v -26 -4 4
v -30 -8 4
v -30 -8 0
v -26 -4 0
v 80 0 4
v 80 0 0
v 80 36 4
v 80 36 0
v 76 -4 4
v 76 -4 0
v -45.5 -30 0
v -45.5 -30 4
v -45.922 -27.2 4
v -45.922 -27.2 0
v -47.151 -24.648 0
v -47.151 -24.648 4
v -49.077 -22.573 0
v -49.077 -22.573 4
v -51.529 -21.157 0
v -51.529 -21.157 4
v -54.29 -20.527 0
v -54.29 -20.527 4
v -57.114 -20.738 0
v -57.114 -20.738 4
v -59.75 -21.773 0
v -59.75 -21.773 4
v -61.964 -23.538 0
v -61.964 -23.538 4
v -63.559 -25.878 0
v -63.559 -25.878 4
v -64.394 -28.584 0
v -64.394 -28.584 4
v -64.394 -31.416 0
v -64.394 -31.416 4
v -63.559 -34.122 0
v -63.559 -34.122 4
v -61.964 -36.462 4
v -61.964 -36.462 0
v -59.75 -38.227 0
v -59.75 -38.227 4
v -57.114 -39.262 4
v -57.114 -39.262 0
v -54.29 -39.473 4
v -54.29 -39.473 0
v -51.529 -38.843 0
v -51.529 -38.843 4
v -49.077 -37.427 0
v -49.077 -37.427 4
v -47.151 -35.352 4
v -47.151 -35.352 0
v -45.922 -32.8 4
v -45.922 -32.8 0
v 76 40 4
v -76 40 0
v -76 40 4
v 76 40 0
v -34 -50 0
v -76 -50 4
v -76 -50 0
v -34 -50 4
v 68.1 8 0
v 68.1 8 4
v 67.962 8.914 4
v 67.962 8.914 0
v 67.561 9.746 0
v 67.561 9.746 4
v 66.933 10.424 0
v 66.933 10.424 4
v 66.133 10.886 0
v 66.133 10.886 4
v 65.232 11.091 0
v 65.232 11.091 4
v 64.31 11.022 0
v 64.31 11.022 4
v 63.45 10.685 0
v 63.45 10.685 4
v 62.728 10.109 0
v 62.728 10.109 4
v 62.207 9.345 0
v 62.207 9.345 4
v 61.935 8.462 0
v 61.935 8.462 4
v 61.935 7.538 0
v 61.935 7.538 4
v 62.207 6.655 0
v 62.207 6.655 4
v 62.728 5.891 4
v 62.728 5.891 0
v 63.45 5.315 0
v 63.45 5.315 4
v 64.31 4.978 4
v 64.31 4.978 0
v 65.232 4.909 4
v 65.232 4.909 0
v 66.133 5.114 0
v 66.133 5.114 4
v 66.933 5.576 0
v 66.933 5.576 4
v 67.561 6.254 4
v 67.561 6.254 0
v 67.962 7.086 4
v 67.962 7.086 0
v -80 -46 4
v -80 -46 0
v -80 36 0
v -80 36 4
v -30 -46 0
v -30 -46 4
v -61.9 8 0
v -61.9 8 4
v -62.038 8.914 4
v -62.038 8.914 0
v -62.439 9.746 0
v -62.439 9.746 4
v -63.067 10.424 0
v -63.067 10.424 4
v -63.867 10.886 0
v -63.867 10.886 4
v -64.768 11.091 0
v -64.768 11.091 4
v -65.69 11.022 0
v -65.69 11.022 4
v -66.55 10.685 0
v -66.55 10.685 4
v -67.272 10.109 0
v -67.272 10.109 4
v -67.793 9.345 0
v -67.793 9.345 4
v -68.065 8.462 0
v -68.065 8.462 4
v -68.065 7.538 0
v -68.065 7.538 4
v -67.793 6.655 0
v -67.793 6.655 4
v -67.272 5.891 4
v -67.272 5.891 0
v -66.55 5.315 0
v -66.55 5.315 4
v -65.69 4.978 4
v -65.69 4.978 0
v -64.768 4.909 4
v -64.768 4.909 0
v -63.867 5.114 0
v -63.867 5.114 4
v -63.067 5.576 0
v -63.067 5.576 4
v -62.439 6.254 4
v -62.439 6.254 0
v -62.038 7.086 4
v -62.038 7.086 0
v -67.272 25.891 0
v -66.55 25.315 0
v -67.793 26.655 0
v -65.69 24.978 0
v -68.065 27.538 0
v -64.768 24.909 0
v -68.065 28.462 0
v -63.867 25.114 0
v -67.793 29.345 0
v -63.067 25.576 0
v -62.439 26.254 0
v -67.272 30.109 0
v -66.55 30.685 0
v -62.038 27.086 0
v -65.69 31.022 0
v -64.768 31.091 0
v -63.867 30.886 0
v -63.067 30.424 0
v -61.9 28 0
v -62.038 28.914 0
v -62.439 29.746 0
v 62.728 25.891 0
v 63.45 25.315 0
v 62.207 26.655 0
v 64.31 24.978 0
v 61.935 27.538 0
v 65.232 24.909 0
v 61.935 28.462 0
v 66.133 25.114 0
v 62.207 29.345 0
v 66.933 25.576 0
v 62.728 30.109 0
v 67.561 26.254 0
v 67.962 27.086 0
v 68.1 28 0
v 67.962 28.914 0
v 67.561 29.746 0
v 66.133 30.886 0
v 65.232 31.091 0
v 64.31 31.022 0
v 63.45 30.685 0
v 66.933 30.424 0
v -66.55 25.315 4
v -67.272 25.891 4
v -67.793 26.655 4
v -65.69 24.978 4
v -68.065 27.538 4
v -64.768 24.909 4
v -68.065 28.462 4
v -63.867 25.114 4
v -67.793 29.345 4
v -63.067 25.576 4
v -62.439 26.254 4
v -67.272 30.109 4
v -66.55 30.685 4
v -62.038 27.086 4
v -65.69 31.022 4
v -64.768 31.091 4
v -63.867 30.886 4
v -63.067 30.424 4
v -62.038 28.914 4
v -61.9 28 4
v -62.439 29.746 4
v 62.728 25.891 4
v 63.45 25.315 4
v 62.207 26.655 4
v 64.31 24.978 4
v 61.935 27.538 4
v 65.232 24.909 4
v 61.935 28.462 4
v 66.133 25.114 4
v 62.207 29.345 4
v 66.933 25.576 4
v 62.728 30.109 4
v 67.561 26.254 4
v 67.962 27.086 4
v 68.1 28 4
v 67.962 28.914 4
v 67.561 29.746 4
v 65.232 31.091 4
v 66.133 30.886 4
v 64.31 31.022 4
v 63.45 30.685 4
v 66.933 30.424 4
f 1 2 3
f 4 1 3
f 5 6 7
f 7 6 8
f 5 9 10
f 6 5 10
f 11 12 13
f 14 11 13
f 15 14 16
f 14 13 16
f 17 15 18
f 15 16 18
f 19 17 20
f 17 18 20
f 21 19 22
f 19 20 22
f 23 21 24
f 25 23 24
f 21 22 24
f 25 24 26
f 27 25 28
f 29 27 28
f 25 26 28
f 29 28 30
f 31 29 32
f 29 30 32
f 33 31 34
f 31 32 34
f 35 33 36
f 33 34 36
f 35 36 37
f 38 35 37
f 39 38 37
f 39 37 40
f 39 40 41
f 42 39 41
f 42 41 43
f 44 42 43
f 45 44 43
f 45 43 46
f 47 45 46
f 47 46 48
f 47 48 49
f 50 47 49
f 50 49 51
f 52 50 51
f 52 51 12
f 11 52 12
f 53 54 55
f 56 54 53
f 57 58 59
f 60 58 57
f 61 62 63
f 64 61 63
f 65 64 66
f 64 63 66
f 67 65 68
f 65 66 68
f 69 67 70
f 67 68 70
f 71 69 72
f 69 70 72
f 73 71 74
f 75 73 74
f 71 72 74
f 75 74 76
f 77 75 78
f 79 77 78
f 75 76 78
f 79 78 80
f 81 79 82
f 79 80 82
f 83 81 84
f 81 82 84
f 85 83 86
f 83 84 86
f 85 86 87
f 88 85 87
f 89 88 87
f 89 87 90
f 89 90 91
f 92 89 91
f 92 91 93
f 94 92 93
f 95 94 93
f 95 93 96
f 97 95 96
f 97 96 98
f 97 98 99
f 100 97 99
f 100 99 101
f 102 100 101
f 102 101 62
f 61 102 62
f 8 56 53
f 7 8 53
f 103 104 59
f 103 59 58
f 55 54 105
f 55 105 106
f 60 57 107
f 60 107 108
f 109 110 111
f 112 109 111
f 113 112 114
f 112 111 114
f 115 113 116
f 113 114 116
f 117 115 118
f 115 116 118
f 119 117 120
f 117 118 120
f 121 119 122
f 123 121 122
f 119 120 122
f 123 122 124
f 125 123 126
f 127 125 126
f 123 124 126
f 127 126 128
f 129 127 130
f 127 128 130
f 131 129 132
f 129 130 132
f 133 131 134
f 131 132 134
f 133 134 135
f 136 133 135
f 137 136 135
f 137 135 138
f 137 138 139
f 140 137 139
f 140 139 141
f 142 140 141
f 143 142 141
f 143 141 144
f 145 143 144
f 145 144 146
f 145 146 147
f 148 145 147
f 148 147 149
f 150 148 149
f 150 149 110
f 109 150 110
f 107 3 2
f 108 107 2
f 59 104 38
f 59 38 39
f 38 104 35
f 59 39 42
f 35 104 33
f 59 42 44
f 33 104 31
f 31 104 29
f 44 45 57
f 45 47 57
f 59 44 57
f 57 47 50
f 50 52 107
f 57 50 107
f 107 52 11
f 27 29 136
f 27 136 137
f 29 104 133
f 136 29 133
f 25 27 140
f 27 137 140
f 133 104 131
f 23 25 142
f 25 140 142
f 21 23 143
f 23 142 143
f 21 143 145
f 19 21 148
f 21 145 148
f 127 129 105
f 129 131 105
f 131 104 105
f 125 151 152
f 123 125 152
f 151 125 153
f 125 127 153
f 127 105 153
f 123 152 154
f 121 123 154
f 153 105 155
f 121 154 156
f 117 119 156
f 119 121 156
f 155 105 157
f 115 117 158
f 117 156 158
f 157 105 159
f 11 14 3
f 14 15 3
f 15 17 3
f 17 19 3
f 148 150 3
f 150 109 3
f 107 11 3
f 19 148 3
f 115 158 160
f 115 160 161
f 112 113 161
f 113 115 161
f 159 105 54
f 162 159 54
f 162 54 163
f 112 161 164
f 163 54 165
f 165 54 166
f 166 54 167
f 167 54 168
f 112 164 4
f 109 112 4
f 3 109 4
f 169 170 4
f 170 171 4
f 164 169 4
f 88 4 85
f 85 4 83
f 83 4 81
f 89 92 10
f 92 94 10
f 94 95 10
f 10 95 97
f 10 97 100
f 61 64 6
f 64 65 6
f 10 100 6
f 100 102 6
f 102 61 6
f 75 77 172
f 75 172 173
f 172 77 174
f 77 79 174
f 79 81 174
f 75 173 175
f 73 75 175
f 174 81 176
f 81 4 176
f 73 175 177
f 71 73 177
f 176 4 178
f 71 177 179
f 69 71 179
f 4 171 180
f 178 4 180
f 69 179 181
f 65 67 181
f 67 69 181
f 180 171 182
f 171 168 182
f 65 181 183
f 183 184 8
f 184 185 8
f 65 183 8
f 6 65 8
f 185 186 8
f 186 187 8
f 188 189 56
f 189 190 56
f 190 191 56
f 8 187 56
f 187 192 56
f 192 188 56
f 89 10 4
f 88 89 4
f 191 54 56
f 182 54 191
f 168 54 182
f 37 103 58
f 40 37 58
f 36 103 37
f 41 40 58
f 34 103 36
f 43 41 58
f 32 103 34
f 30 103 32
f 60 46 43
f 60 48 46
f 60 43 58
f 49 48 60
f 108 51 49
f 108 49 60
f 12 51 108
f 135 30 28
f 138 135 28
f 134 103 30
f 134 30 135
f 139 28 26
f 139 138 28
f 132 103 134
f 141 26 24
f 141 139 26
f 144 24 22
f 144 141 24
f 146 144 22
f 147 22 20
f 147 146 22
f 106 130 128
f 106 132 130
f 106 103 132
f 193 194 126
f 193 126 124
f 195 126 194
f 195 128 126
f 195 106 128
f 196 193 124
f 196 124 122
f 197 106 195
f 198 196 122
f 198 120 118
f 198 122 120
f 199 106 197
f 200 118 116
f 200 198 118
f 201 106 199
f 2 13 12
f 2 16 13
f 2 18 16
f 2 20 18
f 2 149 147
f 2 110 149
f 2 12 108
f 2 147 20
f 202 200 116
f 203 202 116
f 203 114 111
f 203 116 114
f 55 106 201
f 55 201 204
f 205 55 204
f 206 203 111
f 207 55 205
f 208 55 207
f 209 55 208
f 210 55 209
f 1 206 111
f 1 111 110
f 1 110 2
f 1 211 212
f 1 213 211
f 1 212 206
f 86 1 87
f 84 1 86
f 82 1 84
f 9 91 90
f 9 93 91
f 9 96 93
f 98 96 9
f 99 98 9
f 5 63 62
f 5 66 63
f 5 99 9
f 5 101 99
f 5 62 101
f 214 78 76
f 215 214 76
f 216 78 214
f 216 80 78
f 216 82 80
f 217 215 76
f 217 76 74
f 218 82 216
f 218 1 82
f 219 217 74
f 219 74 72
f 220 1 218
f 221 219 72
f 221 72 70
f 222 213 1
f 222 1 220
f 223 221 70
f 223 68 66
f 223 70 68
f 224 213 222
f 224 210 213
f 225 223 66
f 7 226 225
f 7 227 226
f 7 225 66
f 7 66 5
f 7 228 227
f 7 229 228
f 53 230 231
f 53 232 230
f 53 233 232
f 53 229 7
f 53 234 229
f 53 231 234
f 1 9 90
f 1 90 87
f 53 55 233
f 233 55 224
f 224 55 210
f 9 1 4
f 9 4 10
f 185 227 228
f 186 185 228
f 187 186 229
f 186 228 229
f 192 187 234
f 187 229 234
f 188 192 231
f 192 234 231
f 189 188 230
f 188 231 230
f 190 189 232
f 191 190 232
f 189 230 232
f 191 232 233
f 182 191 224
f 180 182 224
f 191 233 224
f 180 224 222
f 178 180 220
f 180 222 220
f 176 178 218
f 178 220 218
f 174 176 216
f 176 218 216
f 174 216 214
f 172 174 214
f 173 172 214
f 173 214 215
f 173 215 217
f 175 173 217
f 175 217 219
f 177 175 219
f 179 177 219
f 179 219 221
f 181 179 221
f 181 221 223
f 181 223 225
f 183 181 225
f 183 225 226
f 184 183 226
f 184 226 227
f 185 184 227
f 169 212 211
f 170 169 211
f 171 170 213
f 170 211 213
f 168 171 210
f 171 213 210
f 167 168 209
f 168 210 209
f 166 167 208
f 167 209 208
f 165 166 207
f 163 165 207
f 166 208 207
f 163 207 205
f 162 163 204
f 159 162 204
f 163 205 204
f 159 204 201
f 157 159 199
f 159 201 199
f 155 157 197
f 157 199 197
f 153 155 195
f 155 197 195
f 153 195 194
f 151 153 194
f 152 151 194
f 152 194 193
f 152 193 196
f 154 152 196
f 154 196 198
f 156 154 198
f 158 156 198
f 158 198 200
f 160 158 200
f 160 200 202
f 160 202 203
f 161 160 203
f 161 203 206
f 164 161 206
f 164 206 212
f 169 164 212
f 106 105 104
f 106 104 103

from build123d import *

# Parameters (mm, degrees)
SKETCH_1_W                  = 160
SKETCH_1_H                  = 80
EXTRUDE_1_DEPTH             = 4
SKETCH_2_R                  = 3.1
CUT_EXTRUDE_1_DEPTH         = 90.532117142
PATTERN_LINEAR_1_COUNT      = 2
PATTERN_LINEAR_1_PITCH      = 20
PATTERN_LINEAR_1_COUNT_DIR2 = 2
PATTERN_LINEAR_1_PITCH_DIR2 = 130
SKETCH_3_W                  = 110
SKETCH_3_H                  = 36
CUT_EXTRUDE_2_DEPTH         = 90.532117142
SKETCH_4_W                  = 50
SKETCH_4_H                  = 4
EXTRUDE_2_DEPTH             = 10
CHAMFER_1_SIZE              = 4
SKETCH_5_R                  = 9.5
CUT_EXTRUDE_3_DEPTH         = 95.424573073


with BuildPart() as part:
    # 草圖1 → 填料-伸長1 (new body)
    with BuildSketch(Plane.XY):
        Rectangle(SKETCH_1_W, SKETCH_1_H)
    extrude(amount=EXTRUDE_1_DEPTH)

    # 草圖2 → 除料-伸長1 (cut, through all)
    with BuildSketch(Plane.XY.offset(4)):
        with Locations((65, 28)):
            Circle(SKETCH_2_R)
    cut_extrude_1 = extrude(amount=-CUT_EXTRUDE_1_DEPTH, mode=Mode.SUBTRACT)

    # 直線複製排列1: Cut-Extrude 1 2 × 2
    with Locations(*[(-j * PATTERN_LINEAR_1_PITCH_DIR2, -i * PATTERN_LINEAR_1_PITCH, 0) for i in range(PATTERN_LINEAR_1_COUNT) for j in range(PATTERN_LINEAR_1_COUNT_DIR2) if (i, j) != (0, 0)]):
        add(cut_extrude_1, mode=Mode.SUBTRACT)

    # 草圖3 → 除料-伸長2 (cut, through all)
    with BuildSketch(Plane.XY.offset(4)):
        with Locations((25, -22)):
            Rectangle(SKETCH_3_W, SKETCH_3_H)
    extrude(amount=-CUT_EXTRUDE_2_DEPTH, mode=Mode.SUBTRACT)

    # 草圖4 → 填料-伸長2 (add)
    with BuildSketch(Plane.XZ.offset(40)):
        with Locations((-55, 2)):
            Rectangle(SKETCH_4_W, SKETCH_4_H)
    extrude(amount=EXTRUDE_2_DEPTH)

    # 導角1
    chamfer_1_edges = [part.edges().sort_by_distance(p)[0] for p in [
        (80, -4, 2),
        (-30, -4, 2),
        (-80, -50, 2),
        (-30, -50, 2),
        (-80, 40, 2),
        (80, 40, 2),
    ]]
    chamfer(chamfer_1_edges, length=CHAMFER_1_SIZE)

    # 草圖5 → 除料-伸長3 (cut, through all)
    with BuildSketch(Plane.XY.offset(4)):
        with Locations((-55, -30)):
            Circle(SKETCH_5_R)
    extrude(amount=-CUT_EXTRUDE_3_DEPTH, mode=Mode.SUBTRACT)


solid = part.part
